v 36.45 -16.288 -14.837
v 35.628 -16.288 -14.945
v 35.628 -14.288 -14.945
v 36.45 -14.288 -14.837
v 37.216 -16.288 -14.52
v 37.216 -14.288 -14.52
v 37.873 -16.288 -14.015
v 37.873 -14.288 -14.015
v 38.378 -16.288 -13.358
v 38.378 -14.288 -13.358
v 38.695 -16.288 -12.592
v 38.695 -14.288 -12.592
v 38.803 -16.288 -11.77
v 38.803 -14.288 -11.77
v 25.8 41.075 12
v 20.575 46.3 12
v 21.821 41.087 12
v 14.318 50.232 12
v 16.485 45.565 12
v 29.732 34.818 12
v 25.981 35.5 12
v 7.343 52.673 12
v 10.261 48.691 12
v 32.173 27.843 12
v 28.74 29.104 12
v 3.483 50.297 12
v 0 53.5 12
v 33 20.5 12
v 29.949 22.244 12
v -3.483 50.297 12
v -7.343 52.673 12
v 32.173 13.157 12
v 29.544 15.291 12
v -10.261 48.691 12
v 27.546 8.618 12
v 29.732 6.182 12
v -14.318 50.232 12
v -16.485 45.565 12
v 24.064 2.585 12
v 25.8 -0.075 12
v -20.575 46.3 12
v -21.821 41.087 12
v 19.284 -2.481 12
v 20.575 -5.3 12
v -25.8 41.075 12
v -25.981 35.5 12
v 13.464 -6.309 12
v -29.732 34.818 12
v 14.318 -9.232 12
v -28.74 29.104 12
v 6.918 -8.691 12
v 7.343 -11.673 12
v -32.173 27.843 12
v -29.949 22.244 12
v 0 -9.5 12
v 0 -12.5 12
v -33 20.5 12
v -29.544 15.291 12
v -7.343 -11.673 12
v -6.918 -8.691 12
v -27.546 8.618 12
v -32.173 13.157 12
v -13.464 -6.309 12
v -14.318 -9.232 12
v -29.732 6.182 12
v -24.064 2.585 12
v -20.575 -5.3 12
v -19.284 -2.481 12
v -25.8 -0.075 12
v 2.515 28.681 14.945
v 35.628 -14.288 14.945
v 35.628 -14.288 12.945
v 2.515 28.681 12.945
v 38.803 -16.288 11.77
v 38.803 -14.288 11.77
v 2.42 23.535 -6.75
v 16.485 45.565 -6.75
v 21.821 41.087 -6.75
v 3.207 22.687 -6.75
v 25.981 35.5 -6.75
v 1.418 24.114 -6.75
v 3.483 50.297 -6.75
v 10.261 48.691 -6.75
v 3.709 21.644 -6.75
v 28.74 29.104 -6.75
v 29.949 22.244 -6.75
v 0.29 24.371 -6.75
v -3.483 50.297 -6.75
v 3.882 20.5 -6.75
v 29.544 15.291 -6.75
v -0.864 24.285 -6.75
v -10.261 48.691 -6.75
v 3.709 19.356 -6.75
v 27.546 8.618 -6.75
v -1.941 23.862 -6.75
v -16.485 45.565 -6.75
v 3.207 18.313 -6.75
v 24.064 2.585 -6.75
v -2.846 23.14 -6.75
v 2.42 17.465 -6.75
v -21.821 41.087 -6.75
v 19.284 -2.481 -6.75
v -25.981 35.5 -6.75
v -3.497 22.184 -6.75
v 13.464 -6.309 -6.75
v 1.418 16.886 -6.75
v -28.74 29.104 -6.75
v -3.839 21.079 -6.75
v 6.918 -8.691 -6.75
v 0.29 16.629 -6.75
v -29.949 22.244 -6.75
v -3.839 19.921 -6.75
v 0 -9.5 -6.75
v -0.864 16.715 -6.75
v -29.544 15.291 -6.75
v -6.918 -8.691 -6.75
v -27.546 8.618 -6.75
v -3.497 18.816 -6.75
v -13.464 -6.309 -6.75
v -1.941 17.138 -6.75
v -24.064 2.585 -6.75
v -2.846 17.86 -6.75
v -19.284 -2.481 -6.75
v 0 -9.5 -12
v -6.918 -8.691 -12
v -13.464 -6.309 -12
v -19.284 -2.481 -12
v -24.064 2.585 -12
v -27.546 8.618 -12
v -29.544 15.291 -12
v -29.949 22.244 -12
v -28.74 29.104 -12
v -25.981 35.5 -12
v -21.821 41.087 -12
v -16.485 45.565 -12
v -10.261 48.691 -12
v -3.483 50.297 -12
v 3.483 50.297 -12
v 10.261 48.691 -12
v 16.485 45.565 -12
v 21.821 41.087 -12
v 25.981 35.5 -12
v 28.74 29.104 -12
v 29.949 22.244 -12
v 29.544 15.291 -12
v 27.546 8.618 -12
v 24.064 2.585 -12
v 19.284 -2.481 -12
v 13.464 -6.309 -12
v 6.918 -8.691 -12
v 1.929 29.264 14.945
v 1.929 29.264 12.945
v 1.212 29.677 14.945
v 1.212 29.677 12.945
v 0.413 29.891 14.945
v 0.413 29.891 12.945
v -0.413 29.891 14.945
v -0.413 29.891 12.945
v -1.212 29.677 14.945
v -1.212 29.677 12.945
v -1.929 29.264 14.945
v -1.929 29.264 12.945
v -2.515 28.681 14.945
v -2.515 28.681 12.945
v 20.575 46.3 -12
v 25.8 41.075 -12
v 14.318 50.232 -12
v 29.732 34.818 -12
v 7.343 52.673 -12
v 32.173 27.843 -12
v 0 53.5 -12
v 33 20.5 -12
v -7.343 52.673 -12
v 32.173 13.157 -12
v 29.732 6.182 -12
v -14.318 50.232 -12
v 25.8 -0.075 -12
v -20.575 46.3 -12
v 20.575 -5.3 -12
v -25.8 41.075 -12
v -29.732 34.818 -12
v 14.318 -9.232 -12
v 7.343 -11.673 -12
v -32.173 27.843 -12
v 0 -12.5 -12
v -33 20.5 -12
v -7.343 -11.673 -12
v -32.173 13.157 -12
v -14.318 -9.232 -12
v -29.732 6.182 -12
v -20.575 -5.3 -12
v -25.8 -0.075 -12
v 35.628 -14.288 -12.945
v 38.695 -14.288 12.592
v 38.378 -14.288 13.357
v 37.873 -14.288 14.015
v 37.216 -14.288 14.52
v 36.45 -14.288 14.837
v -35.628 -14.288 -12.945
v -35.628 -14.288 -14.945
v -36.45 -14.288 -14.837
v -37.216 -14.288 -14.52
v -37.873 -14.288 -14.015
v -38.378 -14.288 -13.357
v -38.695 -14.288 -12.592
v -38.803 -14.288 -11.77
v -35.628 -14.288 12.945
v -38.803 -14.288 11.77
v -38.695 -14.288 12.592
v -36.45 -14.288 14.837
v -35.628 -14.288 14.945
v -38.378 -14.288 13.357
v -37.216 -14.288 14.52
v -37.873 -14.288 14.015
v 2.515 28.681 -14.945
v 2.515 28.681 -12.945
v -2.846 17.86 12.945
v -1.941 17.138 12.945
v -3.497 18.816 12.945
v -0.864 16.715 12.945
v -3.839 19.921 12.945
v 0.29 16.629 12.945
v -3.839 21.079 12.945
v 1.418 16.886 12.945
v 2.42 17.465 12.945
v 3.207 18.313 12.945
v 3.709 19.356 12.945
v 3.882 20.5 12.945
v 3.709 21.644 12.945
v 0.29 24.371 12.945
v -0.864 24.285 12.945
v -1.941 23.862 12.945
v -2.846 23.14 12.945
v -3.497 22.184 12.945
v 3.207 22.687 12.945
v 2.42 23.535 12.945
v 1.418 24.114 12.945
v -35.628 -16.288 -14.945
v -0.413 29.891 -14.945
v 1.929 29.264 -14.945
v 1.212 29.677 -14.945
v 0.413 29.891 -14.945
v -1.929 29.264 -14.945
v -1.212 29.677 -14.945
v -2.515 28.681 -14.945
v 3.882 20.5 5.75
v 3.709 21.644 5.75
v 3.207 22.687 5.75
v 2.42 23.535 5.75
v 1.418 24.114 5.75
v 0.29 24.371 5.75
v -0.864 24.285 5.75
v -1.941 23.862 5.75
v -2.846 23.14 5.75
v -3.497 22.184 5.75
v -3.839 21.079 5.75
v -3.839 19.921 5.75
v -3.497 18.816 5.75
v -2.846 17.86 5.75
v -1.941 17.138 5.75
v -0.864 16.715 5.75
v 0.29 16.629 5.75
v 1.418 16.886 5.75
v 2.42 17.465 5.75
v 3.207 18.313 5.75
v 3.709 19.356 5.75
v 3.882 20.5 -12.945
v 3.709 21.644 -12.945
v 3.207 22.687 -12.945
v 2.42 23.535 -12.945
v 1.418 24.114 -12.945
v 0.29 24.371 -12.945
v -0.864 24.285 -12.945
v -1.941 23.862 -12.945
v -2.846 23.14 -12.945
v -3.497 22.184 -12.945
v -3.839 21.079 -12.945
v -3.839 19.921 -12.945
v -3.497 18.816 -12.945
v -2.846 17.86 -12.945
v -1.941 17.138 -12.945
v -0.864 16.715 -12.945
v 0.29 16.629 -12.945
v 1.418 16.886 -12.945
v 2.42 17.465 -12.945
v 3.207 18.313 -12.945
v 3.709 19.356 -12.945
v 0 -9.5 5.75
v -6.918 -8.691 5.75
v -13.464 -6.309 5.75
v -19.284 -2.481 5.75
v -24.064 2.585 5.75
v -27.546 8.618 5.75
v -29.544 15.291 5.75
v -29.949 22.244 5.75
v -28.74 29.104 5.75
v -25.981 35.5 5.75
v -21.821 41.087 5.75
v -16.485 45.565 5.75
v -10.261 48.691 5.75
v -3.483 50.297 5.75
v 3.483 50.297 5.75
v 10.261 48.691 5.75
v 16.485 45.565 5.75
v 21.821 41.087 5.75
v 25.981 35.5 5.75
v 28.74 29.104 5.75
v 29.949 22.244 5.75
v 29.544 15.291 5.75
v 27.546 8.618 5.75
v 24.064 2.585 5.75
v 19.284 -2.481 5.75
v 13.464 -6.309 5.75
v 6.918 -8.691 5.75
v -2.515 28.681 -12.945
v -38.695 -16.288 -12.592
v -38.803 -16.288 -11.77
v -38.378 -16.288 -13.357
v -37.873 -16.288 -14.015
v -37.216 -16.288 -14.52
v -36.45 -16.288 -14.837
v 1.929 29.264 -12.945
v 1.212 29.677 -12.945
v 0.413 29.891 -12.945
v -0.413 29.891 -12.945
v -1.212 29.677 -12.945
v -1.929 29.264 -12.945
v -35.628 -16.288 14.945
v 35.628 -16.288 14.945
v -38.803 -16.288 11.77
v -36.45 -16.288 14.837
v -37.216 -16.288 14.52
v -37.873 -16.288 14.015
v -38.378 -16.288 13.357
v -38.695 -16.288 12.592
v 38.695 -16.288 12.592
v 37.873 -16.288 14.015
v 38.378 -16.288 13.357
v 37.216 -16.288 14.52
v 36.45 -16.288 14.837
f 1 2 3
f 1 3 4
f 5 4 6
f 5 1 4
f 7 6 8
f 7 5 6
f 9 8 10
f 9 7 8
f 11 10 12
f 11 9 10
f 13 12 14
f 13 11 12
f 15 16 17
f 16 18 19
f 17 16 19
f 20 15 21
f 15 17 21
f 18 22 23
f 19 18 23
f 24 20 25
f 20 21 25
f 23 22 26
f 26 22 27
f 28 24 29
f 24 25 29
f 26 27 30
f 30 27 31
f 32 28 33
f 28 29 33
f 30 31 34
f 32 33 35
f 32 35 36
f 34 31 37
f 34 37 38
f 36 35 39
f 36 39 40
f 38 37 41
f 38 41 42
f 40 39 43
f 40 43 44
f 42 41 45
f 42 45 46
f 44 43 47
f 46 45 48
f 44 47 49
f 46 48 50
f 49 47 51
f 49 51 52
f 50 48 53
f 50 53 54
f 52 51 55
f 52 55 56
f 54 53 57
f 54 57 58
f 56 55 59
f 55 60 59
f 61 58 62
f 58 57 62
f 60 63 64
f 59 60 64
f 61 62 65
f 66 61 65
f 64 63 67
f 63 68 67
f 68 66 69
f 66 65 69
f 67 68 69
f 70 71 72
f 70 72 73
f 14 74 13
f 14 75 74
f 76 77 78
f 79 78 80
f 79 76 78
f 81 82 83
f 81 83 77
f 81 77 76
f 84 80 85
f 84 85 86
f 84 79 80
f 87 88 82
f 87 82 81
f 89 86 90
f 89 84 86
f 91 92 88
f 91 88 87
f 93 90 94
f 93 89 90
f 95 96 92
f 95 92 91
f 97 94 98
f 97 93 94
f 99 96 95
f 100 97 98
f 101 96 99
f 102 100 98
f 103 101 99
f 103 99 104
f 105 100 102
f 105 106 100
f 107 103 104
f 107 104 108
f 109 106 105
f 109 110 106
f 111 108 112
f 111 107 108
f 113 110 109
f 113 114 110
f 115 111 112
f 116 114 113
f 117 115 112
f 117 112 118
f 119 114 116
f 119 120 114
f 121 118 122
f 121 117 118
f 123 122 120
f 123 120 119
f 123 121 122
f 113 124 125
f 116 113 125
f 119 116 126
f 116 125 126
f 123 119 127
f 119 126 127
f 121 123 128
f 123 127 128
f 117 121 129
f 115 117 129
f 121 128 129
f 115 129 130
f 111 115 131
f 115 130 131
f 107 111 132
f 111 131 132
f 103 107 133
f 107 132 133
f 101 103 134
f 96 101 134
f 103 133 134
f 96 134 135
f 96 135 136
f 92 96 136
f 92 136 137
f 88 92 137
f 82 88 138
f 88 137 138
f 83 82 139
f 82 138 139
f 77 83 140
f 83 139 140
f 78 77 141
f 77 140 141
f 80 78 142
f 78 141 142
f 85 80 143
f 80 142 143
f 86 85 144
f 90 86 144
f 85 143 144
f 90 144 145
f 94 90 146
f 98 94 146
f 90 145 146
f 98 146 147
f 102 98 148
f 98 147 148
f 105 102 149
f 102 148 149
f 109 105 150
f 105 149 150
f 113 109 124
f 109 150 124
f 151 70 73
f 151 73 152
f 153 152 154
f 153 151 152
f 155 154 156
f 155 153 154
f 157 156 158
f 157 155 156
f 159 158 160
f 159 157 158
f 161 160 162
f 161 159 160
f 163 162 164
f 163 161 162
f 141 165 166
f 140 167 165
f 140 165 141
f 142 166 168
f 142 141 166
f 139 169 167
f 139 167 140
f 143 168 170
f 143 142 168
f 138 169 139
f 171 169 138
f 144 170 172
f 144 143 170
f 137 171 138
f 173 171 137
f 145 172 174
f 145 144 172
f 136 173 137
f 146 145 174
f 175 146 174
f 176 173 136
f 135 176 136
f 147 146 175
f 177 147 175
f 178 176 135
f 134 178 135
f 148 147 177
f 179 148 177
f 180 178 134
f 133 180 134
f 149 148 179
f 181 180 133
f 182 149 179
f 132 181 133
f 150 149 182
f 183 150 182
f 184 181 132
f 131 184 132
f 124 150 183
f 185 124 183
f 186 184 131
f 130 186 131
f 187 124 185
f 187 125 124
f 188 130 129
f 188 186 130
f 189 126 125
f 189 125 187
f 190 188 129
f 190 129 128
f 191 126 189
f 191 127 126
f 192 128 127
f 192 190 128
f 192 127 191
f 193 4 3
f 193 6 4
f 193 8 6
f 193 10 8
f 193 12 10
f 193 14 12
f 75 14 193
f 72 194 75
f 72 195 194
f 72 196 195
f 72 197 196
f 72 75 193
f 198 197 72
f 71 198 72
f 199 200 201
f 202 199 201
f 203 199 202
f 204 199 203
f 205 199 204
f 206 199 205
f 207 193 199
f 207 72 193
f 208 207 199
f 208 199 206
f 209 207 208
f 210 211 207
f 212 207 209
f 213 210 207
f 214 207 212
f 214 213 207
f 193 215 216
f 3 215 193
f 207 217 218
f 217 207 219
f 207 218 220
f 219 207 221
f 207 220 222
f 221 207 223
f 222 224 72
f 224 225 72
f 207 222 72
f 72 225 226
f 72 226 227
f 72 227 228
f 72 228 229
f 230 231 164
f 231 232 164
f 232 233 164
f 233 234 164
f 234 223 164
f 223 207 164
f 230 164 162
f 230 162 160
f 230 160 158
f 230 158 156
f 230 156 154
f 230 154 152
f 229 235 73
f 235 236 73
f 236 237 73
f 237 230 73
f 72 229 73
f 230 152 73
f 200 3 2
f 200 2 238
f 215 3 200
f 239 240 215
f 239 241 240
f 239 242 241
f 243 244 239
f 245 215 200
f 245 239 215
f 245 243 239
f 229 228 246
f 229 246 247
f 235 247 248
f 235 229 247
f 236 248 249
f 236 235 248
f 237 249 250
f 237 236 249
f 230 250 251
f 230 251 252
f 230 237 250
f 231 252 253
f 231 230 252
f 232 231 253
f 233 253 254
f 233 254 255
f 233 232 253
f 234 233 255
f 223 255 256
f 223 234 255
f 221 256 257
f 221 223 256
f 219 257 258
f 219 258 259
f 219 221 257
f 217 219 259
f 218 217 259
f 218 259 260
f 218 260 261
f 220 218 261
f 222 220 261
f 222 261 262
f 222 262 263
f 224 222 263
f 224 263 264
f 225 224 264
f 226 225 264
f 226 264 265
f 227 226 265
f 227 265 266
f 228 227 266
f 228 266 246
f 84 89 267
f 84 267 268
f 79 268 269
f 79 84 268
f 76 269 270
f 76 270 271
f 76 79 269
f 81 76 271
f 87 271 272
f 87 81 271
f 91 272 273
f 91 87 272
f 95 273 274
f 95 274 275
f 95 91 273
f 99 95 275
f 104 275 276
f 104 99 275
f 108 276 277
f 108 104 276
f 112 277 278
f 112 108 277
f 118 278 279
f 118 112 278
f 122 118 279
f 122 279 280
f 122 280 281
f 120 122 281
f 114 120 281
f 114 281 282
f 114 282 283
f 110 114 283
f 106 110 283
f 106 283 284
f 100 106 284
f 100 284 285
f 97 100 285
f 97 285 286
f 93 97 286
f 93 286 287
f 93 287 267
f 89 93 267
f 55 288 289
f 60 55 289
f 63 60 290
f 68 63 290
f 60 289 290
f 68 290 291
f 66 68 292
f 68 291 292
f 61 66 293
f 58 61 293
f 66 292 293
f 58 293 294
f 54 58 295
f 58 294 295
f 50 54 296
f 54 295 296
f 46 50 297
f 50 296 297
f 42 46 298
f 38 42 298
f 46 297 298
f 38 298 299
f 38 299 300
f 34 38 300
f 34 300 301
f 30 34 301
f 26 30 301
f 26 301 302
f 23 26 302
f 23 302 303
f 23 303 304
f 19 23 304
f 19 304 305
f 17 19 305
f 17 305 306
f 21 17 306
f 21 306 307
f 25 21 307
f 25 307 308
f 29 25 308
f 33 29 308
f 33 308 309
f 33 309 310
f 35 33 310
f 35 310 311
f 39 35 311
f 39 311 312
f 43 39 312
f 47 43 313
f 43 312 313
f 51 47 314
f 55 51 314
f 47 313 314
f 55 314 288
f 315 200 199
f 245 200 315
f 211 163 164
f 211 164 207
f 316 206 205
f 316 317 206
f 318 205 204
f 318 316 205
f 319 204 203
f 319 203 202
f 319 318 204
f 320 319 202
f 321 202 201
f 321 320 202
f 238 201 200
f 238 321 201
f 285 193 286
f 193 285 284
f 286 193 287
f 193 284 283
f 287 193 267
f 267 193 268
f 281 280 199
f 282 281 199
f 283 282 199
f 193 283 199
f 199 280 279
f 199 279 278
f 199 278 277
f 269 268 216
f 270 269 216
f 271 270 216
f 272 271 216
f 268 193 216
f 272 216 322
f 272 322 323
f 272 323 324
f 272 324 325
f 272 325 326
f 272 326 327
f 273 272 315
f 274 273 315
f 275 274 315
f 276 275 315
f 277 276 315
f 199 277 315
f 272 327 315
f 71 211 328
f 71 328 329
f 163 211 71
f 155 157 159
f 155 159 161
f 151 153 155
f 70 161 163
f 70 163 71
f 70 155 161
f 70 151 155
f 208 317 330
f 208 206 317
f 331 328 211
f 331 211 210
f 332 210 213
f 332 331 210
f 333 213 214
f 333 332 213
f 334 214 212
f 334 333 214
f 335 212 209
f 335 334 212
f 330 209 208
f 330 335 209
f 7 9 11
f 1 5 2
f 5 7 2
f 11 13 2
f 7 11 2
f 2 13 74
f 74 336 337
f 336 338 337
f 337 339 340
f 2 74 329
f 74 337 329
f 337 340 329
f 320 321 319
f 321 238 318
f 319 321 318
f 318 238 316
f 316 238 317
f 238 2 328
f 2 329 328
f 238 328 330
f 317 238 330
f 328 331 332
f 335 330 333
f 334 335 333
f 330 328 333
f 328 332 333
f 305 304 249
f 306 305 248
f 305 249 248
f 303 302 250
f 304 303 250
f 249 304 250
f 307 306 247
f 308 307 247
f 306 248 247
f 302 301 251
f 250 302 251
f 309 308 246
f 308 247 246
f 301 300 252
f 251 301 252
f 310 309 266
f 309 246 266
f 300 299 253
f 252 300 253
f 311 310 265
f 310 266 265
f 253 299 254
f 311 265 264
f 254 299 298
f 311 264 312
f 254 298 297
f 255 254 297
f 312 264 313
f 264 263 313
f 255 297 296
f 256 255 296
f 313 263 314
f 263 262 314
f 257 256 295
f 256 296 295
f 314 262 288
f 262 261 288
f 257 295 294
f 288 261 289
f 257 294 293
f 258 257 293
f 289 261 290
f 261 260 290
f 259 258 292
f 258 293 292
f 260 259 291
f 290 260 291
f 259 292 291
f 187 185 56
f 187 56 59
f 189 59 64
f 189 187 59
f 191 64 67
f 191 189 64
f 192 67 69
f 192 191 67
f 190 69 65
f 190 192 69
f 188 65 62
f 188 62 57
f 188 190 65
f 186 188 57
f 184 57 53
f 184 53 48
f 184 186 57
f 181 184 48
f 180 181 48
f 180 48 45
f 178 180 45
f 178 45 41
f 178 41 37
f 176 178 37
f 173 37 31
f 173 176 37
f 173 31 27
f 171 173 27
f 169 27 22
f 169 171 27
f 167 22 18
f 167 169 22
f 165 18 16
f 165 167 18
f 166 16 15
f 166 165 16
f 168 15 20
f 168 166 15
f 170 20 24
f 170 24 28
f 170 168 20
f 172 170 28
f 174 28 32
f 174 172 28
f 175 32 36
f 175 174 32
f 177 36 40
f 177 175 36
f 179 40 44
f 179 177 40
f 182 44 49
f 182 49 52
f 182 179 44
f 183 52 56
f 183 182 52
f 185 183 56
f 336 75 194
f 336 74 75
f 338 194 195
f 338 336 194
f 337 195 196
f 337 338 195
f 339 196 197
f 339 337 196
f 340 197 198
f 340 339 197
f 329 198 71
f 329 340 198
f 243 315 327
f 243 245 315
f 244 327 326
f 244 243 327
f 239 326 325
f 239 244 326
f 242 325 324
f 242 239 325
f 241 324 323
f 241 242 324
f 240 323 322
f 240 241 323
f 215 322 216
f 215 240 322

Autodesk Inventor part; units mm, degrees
ref_plane "YZ Plane" through (0, 0, 0) normal (1, 0, 0) x (0, 1, 0)
ref_plane "XY Plane" through (0, 0, 0) normal (0, 0, 1) x (1, 0, 0)
sketch "Sketch1" plane through (0, 0, 0) normal (1, 0, 0) x (0, 1, 0)
  line L0 (-12.5, -12) -> (-9.5, -12)
  line L1 (-9.5, 12) -> (-12.5, 12)
  line L2 (-12.5, 12) -> (-12.5, -12)
  line L3 (-12.5, -12) -> (12.5, 12) construction
  line L4 (12.5, -12) -> (-12.5, 12) construction
  line L5 (20.5, 5.75) -> (-9.5, 5.75)
  line L6 (20.5, -6.75) -> (-9.5, -6.75)
  line L7 (20.5, 5.75) -> (20.5, -6.75)
  line L8 (-9.5, 12) -> (-9.5, 5.75)
  line L9 (-9.5, -6.75) -> (-9.5, -12)
  point P0 (0, 0)
  dimension "d0" = 25
  dimension "d2" = 6.25
  dimension "d3" = 12.5
  dimension "d5" = 24
  dimension "d7" = 3
  dimension "d8" = 3
  dimension "d9" = 30
revolve "Revolution1" add sketch "Sketch1" angle 360 about axis through (0, 20.5, 5.75) along (0, 0, -1)
ref_plane "Work Plane1" through (0, -14.2875, 0) normal (0, 1, 0) x (-1, 0, 0)
sketch "Sketch2" plane through (0, -14.2875, 0) normal (0, 1, 0) x (-1, 0, 0)
  line L0 (38.8032, 14.945) -> (-38.8032, 14.945)
  line L1 (-38.8032, 14.945) -> (-38.8032, -14.945)
  line L2 (-38.8032, -14.945) -> (38.8032, -14.945)
  line L3 (38.8032, -14.945) -> (38.8032, 14.945)
  line L4 (38.8032, 14.945) -> (-38.8032, -14.945) construction
  line L5 (-38.8032, 14.945) -> (38.8032, -14.945) construction
  point P0 (0, 0)
extrude "Extrusion1" add sketch "Sketch2" against normal blind 2
fillet "Fillet1" radius 3.175 4 edges at (-38.8032, -15.2875, 14.945) (-38.8032, -15.2875, -14.945) (38.8032, -15.2875, 14.945) (38.8032, -15.2875, -14.945)
sketch "Sketch3" plane through (-35.6282, -14.2875, 14.945) normal (0, 0, 1) x (1, 0, 0)
  line L0 (71.2564, 0) -> (74.4314, 0) projected
  line L1 (71.2564, 0) -> (38.1431, 42.9682)
  line L2 (0, -2) -> (0, 0) projected
  line L3 (33.1133, 42.9682) -> (0, 0)
  line L4 (0, 0) -> (71.2564, 0)
  arc A0 (38.1431, 42.9682) -> (33.1133, 42.9682) centre (35.6282, 41.0302) ccw
  point P0 (35.6282, 14.2875)
  dimension "d14" = 3.175
extrude "Extrusion2" add sketch "Sketch3" against normal blind 2
mirror "Mirror1" about plane through (0, 0, 0) normal (0, 0, 1) of "Extrusion2"
sketch "Sketch4" plane through (-35.6282, -16.2875, 14.945) normal (0, 0, 1) x (1, 0, 0)
  circle A0 centre (35.6282, 36.7875) radius 30 projected
  circle A1 centre (35.6282, 36.7875) radius 3.8819
  point P0 (35.6282, 16.2875)
extrude "Extrusion3" add sketch "Sketch4" against normal blind 28.9875 contours A1
properties part number "roller_coaster_wheel" material "Iron, Gray"
